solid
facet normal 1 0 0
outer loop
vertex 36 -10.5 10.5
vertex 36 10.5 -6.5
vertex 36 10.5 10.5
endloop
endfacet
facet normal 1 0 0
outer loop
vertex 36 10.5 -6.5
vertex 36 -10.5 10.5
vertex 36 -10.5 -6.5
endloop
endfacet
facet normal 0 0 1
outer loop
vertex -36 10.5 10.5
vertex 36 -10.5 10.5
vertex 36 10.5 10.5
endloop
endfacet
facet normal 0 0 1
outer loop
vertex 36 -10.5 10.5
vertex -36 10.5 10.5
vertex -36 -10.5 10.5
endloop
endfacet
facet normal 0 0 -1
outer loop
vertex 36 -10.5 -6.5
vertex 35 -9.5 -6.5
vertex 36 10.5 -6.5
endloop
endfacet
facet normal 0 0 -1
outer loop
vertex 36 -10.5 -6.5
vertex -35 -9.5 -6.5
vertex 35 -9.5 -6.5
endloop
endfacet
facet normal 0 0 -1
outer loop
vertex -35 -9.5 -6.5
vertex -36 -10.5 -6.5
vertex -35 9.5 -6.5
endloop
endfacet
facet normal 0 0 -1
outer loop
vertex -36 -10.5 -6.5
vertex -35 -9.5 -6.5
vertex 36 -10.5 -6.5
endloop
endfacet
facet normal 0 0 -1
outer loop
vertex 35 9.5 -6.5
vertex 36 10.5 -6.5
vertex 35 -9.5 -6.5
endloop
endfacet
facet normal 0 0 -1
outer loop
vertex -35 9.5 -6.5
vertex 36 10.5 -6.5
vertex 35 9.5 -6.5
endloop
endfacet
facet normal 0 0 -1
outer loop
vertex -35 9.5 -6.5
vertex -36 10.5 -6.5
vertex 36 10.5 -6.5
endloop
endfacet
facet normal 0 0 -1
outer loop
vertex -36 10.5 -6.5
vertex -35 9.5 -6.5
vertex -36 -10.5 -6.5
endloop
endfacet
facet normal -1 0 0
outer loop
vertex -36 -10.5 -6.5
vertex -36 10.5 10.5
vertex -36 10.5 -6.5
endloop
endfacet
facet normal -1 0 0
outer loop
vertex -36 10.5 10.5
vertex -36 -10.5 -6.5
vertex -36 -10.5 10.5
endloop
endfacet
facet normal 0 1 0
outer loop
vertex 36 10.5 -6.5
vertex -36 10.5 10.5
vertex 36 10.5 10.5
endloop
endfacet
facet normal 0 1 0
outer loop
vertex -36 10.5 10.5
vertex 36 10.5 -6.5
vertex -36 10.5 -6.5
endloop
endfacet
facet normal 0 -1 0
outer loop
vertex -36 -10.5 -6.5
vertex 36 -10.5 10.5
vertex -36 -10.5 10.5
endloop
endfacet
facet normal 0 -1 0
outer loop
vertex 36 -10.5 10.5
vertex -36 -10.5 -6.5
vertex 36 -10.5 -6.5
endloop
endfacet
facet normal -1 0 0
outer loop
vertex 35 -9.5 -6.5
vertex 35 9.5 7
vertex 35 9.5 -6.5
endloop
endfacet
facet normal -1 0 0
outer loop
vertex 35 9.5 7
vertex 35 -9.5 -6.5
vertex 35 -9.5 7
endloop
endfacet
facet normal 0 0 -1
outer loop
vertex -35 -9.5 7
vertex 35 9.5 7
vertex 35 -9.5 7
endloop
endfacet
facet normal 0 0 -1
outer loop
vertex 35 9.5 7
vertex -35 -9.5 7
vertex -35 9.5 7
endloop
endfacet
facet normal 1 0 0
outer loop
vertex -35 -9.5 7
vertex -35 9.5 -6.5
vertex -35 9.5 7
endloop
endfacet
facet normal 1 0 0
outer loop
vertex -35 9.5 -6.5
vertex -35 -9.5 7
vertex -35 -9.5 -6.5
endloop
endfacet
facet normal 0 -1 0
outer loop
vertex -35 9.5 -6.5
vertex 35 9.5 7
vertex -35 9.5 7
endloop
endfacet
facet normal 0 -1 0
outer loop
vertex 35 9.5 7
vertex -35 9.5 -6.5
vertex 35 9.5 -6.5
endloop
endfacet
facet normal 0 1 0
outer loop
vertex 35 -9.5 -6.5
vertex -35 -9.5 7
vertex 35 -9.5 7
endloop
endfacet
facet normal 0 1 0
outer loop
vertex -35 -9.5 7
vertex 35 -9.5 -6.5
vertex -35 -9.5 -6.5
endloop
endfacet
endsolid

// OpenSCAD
difference() {
    translate([0,0,2])
        cube([72,21,17],true);
    
    
    cube([70,19,14], true);
    
    
}
